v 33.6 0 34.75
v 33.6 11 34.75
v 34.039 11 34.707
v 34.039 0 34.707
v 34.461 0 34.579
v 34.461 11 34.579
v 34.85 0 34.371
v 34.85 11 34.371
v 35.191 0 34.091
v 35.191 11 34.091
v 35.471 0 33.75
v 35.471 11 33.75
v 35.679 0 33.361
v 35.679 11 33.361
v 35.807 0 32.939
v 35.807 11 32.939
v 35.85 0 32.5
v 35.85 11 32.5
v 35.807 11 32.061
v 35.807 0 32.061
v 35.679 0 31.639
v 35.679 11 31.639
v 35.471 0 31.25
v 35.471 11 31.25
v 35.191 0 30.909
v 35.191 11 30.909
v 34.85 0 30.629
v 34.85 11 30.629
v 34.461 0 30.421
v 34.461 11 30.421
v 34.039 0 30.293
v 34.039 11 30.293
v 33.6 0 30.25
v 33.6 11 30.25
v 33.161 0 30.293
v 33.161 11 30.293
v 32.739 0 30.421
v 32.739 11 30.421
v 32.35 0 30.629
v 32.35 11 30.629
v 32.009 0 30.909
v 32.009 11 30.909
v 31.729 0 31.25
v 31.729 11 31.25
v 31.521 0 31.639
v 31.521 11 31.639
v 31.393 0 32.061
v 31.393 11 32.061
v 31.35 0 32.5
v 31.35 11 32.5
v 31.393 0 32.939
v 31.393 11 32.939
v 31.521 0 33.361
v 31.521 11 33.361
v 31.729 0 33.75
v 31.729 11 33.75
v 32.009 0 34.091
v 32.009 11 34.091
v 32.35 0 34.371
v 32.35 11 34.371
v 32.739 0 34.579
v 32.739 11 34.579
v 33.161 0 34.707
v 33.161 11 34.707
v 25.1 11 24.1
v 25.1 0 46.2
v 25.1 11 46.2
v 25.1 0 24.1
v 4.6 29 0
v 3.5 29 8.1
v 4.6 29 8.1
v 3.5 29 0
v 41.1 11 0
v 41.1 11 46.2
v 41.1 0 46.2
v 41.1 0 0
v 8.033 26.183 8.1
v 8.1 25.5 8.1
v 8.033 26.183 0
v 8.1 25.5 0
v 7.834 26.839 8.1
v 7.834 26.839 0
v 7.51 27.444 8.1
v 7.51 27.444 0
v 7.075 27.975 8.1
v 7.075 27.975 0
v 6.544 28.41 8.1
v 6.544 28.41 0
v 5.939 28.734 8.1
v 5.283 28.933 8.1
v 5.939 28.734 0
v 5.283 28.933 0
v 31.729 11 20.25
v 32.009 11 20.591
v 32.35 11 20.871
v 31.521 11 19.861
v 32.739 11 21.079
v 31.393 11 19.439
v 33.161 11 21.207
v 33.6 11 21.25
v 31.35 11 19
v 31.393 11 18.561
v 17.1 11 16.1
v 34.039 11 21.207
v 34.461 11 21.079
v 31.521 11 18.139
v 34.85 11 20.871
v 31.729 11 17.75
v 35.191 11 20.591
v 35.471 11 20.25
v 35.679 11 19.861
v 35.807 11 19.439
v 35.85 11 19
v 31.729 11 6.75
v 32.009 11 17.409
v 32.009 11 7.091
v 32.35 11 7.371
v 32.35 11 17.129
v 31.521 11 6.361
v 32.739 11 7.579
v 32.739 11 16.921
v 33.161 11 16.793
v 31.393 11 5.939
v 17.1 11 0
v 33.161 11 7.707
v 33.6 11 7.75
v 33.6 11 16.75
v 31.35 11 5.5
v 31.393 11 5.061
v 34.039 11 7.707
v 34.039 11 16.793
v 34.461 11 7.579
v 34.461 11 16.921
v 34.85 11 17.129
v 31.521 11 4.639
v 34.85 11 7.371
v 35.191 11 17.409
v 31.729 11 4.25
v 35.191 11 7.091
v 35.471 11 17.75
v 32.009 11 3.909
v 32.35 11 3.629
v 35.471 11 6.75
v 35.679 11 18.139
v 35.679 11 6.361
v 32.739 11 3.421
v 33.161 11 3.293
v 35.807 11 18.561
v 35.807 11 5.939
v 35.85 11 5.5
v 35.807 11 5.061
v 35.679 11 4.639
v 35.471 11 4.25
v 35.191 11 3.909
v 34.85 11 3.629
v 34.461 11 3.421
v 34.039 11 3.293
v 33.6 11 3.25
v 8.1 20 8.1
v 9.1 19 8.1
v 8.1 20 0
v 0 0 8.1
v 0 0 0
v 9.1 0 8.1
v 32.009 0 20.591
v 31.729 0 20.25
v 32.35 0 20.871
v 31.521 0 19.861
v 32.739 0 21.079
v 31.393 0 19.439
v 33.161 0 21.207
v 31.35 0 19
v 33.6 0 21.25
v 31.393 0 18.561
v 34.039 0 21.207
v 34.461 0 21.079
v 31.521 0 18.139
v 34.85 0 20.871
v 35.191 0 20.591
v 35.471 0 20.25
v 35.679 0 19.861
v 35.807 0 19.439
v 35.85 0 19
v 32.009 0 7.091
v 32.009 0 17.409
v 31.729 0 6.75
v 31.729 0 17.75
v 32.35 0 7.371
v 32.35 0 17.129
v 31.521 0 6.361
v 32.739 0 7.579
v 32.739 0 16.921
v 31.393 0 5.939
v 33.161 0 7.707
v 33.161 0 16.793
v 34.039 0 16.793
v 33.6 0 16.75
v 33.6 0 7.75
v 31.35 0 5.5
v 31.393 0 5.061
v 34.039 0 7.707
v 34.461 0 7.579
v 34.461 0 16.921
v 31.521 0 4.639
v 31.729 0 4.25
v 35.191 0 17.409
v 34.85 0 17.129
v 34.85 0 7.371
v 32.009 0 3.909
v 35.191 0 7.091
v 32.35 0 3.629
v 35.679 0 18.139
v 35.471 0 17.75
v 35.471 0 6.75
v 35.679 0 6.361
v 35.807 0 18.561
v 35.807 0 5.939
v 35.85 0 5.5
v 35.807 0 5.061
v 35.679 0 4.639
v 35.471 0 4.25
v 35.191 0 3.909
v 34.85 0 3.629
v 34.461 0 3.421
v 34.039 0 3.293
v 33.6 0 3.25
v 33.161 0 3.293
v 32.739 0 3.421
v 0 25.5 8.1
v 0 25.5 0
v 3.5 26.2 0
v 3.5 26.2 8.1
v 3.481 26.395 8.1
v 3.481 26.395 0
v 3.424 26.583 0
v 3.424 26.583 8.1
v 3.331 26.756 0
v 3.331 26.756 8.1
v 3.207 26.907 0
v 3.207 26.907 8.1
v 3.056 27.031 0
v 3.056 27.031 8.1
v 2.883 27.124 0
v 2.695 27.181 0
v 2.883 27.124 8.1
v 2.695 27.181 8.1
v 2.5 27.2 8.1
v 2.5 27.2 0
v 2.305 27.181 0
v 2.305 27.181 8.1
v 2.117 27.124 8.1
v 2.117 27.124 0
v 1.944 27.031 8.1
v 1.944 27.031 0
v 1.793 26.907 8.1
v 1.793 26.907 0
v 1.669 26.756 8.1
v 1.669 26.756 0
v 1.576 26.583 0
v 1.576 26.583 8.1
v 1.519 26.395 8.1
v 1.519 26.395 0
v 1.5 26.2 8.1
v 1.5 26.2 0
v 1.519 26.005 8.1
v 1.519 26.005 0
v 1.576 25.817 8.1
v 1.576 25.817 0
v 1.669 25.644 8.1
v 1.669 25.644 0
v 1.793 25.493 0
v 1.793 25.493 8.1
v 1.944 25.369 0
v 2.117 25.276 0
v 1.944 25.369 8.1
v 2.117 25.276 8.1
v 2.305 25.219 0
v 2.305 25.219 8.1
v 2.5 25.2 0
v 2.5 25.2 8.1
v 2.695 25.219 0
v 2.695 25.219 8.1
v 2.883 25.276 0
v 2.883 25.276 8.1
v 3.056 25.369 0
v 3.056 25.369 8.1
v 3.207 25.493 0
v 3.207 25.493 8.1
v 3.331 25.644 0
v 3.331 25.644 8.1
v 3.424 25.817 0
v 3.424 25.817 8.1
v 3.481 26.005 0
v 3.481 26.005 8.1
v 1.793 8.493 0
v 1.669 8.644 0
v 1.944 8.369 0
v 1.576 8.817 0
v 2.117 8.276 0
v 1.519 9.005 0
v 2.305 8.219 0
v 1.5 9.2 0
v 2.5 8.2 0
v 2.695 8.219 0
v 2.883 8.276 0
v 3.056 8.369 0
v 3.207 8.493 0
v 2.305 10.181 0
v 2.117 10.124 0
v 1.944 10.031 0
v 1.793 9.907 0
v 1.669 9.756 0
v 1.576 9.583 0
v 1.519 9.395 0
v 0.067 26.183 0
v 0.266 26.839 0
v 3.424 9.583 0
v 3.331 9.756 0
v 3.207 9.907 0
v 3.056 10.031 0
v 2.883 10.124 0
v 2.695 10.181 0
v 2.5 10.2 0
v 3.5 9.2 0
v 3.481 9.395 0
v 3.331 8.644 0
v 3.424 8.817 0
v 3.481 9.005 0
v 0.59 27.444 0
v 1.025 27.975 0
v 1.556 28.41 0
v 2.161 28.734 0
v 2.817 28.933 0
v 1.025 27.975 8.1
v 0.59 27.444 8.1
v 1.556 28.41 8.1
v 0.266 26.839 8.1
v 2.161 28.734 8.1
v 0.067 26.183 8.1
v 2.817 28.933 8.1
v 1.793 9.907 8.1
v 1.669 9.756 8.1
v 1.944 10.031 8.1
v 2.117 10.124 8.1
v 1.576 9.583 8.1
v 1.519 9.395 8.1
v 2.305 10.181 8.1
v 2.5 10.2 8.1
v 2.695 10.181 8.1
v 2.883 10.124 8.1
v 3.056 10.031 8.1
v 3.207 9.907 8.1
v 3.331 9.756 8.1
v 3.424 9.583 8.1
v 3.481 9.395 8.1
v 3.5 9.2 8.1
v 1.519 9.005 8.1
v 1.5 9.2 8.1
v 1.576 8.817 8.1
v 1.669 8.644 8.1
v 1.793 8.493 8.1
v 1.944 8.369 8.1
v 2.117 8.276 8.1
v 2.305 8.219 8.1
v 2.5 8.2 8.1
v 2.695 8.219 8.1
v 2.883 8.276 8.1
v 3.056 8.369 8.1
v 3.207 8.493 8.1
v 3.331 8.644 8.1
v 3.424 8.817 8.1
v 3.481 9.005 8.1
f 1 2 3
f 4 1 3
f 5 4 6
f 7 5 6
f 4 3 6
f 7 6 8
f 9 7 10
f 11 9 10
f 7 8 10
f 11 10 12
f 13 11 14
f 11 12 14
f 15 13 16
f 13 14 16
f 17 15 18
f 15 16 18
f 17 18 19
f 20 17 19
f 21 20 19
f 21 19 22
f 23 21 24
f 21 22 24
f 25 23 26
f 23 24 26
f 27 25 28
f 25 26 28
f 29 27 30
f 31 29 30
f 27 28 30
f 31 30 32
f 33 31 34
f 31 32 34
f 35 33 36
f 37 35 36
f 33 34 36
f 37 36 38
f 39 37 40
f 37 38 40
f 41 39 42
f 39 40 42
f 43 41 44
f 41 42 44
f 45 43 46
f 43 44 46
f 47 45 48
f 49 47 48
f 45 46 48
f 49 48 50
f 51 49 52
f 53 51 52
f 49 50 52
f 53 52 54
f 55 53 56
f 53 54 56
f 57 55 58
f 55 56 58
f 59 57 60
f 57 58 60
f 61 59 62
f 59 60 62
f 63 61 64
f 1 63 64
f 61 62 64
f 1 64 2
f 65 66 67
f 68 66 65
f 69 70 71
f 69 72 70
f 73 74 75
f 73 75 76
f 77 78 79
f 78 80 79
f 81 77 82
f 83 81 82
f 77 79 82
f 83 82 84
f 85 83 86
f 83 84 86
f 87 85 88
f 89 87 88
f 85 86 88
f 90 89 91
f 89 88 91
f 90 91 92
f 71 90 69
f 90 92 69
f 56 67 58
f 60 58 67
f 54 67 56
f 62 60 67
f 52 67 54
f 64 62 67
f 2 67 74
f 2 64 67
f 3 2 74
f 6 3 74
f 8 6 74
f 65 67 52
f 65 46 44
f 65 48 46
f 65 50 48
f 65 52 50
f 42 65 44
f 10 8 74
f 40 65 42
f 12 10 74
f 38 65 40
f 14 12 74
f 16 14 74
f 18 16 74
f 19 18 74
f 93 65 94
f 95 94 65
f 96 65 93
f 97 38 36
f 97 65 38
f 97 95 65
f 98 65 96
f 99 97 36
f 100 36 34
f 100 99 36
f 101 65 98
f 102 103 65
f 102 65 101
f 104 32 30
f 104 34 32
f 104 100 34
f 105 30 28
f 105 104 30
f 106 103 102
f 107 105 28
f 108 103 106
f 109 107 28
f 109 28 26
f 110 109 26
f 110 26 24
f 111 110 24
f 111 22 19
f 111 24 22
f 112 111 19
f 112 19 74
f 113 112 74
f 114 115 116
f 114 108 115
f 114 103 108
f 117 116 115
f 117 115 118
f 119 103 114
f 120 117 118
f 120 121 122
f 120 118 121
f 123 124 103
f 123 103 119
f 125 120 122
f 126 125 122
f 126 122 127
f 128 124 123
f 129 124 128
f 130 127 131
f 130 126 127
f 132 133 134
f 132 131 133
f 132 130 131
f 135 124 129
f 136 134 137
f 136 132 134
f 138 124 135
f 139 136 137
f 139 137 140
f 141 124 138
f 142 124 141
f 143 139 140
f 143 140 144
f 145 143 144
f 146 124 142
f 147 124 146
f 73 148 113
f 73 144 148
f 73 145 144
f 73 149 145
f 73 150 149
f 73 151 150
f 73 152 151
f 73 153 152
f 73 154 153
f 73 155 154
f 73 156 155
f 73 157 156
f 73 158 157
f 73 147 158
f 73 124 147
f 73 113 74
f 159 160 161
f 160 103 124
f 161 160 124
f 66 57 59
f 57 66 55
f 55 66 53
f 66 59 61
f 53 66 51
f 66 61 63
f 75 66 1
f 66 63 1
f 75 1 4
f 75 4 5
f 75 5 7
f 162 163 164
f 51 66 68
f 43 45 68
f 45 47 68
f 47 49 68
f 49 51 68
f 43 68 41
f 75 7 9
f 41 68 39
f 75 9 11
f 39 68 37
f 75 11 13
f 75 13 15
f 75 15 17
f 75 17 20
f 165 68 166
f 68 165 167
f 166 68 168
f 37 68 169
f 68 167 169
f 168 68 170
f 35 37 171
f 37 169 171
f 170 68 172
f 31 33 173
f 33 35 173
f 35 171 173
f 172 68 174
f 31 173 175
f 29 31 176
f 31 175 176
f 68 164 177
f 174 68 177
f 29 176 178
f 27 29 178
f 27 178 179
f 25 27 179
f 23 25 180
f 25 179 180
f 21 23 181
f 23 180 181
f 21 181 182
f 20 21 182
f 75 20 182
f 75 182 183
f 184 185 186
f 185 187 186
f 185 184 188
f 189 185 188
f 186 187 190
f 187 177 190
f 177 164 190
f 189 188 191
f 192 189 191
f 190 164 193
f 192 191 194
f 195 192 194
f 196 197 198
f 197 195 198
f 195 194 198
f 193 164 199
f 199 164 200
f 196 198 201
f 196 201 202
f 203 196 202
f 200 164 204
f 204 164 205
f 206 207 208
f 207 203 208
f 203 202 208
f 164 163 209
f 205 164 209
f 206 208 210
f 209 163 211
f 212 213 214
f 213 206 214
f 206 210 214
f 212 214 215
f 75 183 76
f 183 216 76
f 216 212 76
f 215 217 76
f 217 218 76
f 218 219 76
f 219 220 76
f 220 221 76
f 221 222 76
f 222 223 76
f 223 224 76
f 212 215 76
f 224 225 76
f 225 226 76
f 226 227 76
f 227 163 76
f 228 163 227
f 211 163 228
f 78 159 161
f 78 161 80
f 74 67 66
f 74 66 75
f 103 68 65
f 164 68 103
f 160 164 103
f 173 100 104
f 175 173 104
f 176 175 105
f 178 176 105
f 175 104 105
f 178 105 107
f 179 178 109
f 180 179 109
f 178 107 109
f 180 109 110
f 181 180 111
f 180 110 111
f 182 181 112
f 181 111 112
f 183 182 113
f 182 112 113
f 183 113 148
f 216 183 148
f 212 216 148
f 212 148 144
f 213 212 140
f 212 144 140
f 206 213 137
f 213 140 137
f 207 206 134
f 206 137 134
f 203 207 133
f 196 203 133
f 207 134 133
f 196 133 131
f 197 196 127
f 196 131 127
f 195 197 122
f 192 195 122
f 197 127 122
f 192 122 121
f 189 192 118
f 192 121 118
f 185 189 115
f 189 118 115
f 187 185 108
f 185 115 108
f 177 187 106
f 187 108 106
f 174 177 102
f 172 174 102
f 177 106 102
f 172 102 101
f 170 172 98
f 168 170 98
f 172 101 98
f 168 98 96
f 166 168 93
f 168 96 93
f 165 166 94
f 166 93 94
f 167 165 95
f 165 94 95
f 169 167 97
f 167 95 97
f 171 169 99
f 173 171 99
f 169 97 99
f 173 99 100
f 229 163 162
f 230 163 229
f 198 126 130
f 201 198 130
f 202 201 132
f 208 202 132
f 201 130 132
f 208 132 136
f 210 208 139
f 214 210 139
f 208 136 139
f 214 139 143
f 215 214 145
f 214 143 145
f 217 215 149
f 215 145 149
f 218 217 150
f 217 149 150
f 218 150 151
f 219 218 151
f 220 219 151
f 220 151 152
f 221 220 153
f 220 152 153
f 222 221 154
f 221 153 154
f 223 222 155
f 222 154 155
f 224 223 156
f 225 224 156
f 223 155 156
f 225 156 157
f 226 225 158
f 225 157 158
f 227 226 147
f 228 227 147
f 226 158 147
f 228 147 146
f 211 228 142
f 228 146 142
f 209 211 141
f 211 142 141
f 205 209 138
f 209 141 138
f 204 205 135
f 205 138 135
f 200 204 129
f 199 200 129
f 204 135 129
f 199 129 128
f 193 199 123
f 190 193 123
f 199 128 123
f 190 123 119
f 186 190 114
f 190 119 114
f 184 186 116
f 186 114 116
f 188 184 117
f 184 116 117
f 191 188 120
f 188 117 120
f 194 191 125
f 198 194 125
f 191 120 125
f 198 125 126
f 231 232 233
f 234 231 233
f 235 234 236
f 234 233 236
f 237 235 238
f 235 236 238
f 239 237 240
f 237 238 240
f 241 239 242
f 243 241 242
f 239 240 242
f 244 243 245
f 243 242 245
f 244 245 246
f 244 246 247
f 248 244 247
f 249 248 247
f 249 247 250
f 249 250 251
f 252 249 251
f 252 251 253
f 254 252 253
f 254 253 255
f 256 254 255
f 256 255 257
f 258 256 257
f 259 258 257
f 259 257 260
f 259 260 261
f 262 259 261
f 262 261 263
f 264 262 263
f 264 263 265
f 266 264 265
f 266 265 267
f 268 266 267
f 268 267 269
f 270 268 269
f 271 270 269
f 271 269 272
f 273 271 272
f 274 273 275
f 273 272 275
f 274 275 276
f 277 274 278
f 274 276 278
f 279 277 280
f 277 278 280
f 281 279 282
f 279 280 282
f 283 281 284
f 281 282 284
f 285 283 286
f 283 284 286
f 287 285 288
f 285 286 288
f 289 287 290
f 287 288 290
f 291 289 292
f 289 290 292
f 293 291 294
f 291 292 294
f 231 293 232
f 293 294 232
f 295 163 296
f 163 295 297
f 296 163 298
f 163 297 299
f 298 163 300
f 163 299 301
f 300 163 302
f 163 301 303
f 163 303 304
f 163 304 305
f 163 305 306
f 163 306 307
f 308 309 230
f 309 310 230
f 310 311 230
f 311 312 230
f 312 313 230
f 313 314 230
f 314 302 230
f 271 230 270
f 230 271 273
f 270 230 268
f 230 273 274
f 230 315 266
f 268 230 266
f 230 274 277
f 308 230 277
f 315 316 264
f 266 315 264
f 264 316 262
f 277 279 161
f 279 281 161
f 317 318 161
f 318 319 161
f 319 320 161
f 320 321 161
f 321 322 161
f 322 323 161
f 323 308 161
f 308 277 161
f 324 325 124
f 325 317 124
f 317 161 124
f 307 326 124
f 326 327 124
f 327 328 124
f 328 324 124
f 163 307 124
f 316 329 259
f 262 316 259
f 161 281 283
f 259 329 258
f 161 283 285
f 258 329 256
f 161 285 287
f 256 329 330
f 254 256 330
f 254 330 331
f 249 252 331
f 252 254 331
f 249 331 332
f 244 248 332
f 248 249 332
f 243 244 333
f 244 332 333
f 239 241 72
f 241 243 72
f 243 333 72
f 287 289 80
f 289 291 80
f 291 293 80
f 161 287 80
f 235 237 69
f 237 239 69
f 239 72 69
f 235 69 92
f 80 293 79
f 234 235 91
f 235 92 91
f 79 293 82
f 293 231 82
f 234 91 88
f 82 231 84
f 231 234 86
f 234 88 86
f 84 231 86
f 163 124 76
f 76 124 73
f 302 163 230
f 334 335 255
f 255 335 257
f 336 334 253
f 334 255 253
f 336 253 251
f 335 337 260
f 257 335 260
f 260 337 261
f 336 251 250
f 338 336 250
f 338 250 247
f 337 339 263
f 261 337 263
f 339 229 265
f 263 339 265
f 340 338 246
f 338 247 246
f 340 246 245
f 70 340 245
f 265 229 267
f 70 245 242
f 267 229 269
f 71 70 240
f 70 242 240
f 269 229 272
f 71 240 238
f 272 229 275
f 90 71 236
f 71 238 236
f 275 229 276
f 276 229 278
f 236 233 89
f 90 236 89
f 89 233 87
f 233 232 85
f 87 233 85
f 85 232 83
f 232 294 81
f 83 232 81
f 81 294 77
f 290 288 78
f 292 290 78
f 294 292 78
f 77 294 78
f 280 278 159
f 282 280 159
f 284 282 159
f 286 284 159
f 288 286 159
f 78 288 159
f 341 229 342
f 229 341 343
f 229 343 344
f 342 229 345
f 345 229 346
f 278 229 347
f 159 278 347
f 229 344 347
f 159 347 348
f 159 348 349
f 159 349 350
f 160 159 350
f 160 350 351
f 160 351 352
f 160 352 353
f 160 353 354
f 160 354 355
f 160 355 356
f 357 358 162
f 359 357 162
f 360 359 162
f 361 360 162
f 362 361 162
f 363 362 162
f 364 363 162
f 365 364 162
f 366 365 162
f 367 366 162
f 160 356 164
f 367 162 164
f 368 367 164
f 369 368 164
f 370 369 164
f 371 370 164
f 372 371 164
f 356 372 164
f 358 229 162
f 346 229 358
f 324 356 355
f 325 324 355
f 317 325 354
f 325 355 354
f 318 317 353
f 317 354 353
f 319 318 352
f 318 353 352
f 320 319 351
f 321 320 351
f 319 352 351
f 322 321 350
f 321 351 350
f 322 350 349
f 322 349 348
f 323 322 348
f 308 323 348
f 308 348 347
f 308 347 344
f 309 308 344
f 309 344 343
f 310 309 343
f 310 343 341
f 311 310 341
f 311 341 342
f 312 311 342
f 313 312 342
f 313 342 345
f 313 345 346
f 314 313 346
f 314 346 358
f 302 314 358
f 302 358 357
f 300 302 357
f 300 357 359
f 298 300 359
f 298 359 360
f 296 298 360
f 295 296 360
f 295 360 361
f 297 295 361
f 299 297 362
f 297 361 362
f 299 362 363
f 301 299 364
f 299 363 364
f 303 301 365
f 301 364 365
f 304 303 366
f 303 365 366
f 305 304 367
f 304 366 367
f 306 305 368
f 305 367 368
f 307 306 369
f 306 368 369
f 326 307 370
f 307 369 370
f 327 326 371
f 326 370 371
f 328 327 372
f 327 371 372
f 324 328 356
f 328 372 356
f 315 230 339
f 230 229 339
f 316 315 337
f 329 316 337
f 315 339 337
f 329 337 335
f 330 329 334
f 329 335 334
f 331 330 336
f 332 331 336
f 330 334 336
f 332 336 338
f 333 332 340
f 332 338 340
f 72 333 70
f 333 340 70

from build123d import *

# Parameters (mm, degrees)
ESQUISSE1_W                  = 18
ESQUISSE1_H                  = 29
BOSS_EXTRU_1_DEPTH           = 46.2
ESQUISSE3_R                  = 1
ENL_V_MAT_EXTRU_1_DEPTH      = 58.440752084
ESQUISSE4_W                  = 18
ESQUISSE4_H                  = 30
ENL_V_MAT_EXTRU_2_DEPTH      = 58.440752084
ESQUISSE5_W                  = 8.1
ESQUISSE5_H                  = 46.2
BOSS_EXTRU_2_DEPTH           = 29
CONG_1_R                     = 3.5
ENL_V_START                  = -46.2
ESQUISSE7_W                  = 18
ESQUISSE7_H                  = 18
ENL_V_MAT_EXTRU_4_DEPTH      = 46.2
ESQUISSE8_W                  = 15
ESQUISSE8_H                  = 46.2
ESQUISSE8_R                  = 2.25
BOSS_EXTRU_3_DEPTH           = 11
CHANFREIN1_SIZE              = 9
CONG_2_R                     = 3.5
ENL_V_MAT_EXTRU_5_DEPTH      = 65.402251513
ENL_V_MAT_EXTRU_5_DEPTH_BACK = 65.402251513
ESQUISSE9_W                  = 25.1
ESQUISSE9_H                  = 38.1
CHANFREIN2_SIZE              = 16


with BuildPart() as part:
    # Esquisse1 → Boss.-Extru.1 (new body)
    with BuildSketch(Plane.XY):
        with Locations((9, 14.5)):
            Rectangle(ESQUISSE1_W, ESQUISSE1_H)
    extrude(amount=BOSS_EXTRU_1_DEPTH)

    # Esquisse3 → Enlèv. mat.-Extru.1 (cut, through all)
    with BuildSketch(Plane.XY.offset(46.2)):
        with Locations((2.5, 26.2)):
            Circle(ESQUISSE3_R)
        with Locations((2.5, 9.2)):
            Circle(ESQUISSE3_R)
    extrude(amount=-ENL_V_MAT_EXTRU_1_DEPTH, mode=Mode.SUBTRACT)

    # Esquisse4 → Enlèv. mat.-Extru.2 (cut, through all)
    with BuildSketch(Plane(origin=(0, 29, 0), x_dir=(1, 0, 0), z_dir=(0, 1, 0))):
        with Locations((9, -23.1)):
            Rectangle(ESQUISSE4_W, ESQUISSE4_H)
    extrude(amount=-ENL_V_MAT_EXTRU_2_DEPTH, mode=Mode.SUBTRACT)


with BuildPart() as enl_v_mat_extru_2_piece_1:
    # of the separate pieces the step leaves, piece 1, a body of its own (enl_v_mat_extru_2_pieces)
    add(part.part.solids().sort_by_distance((0, 0, 0))[0])



with BuildPart() as enl_v_mat_extru_2_piece_2:
    # of the separate pieces the step leaves, piece 2, a body of its own (enl_v_mat_extru_2_pieces)
    add(part.part.solids().sort_by_distance((18, 0, 38.1))[0])


with BuildPart() as enl_v_mat_extru_2_piece_1_1:
    add(enl_v_mat_extru_2_piece_1.part)

    add(enl_v_mat_extru_2_piece_2.part)  # Boss.-Extru.2 merges Enlèv. mat.-Extru.2 piece 2
    # Esquisse5 → Boss.-Extru.2 (add)
    with BuildSketch(Plane(origin=(0, 29, 0), x_dir=(1, 0, 0), z_dir=(0, 1, 0))):
        with Locations((22.05, -23.1)):
            Rectangle(ESQUISSE5_W, ESQUISSE5_H)
    extrude(amount=-BOSS_EXTRU_2_DEPTH)

    # Congé1
    cong_1_edges = [enl_v_mat_extru_2_piece_1_1.edges().sort_by_distance(p)[0] for p in [
        (0, 29, 42.15),
        (0, 29, 4.05),
    ]]
    fillet(cong_1_edges, radius=CONG_1_R)

    # Esquisse7 → Enlèv. mat.-Extru.4 (cut)
    with BuildSketch(Plane(origin=(0, 0, 0), x_dir=(-1, 0, 0), z_dir=(0, 0, -1)).offset(ENL_V_START)):
        with Locations((-17.1, 20)):
            Rectangle(ESQUISSE7_W, ESQUISSE7_H)
    extrude(amount=ENL_V_MAT_EXTRU_4_DEPTH, mode=Mode.SUBTRACT)

    # Esquisse8 → Boss.-Extru.3 (add)
    with BuildSketch(Plane(origin=(0, 11, 0), x_dir=(1, 0, 0), z_dir=(0, 1, 0))):
        with Locations((33.6, -23.1)):
            Rectangle(ESQUISSE8_W, ESQUISSE8_H)
        with Locations(Location((33.6, -5.5, 0), (0, 0, 270))):
            Circle(ESQUISSE8_R, mode=Mode.SUBTRACT)
        with Locations(Location((33.6, -32.5, 0), (0, 0, 270))):
            Circle(ESQUISSE8_R, mode=Mode.SUBTRACT)
        with Locations(Location((33.6, -19, 0), (0, 0, 270))):
            Circle(ESQUISSE8_R, mode=Mode.SUBTRACT)
    extrude(amount=-BOSS_EXTRU_3_DEPTH)

    # Chanfrein1
    chanfrein1_edges = [enl_v_mat_extru_2_piece_1_1.edges().sort_by_distance(p)[0] for p in [
        (8.1, 11, 42.15),
        (8.1, 11, 4.05),
    ]]
    chamfer(chanfrein1_edges, length=CHANFREIN1_SIZE)

    # Congé2
    cong_2_edges = [enl_v_mat_extru_2_piece_1_1.edges().sort_by_distance(p)[0] for p in [
        (8.1, 29, 42.15),
        (8.1, 29, 4.05),
    ]]
    fillet(cong_2_edges, radius=CONG_2_R)

    # Esquisse9 → Enlèv. mat.-Extru.5 (cut, two sides: drawn at the far end of the back side and taken through both)
    with BuildSketch(Plane(origin=(0, 11, 0), x_dir=(1, 0, 0), z_dir=(0, 1, 0)).offset(-ENL_V_MAT_EXTRU_5_DEPTH_BACK)):
        with Locations((12.55, -27.15)):
            Rectangle(ESQUISSE9_W, ESQUISSE9_H)
    extrude(amount=ENL_V_MAT_EXTRU_5_DEPTH + ENL_V_MAT_EXTRU_5_DEPTH_BACK, mode=Mode.SUBTRACT)

    # Chanfrein2
    chanfrein2_edges = [enl_v_mat_extru_2_piece_1_1.edges().sort_by_distance(p)[0] for p in [
        (25.1, 5.5, 8.1),
    ]]
    chamfer(chanfrein2_edges, length=CHANFREIN2_SIZE)


solid = enl_v_mat_extru_2_piece_1_1.part
